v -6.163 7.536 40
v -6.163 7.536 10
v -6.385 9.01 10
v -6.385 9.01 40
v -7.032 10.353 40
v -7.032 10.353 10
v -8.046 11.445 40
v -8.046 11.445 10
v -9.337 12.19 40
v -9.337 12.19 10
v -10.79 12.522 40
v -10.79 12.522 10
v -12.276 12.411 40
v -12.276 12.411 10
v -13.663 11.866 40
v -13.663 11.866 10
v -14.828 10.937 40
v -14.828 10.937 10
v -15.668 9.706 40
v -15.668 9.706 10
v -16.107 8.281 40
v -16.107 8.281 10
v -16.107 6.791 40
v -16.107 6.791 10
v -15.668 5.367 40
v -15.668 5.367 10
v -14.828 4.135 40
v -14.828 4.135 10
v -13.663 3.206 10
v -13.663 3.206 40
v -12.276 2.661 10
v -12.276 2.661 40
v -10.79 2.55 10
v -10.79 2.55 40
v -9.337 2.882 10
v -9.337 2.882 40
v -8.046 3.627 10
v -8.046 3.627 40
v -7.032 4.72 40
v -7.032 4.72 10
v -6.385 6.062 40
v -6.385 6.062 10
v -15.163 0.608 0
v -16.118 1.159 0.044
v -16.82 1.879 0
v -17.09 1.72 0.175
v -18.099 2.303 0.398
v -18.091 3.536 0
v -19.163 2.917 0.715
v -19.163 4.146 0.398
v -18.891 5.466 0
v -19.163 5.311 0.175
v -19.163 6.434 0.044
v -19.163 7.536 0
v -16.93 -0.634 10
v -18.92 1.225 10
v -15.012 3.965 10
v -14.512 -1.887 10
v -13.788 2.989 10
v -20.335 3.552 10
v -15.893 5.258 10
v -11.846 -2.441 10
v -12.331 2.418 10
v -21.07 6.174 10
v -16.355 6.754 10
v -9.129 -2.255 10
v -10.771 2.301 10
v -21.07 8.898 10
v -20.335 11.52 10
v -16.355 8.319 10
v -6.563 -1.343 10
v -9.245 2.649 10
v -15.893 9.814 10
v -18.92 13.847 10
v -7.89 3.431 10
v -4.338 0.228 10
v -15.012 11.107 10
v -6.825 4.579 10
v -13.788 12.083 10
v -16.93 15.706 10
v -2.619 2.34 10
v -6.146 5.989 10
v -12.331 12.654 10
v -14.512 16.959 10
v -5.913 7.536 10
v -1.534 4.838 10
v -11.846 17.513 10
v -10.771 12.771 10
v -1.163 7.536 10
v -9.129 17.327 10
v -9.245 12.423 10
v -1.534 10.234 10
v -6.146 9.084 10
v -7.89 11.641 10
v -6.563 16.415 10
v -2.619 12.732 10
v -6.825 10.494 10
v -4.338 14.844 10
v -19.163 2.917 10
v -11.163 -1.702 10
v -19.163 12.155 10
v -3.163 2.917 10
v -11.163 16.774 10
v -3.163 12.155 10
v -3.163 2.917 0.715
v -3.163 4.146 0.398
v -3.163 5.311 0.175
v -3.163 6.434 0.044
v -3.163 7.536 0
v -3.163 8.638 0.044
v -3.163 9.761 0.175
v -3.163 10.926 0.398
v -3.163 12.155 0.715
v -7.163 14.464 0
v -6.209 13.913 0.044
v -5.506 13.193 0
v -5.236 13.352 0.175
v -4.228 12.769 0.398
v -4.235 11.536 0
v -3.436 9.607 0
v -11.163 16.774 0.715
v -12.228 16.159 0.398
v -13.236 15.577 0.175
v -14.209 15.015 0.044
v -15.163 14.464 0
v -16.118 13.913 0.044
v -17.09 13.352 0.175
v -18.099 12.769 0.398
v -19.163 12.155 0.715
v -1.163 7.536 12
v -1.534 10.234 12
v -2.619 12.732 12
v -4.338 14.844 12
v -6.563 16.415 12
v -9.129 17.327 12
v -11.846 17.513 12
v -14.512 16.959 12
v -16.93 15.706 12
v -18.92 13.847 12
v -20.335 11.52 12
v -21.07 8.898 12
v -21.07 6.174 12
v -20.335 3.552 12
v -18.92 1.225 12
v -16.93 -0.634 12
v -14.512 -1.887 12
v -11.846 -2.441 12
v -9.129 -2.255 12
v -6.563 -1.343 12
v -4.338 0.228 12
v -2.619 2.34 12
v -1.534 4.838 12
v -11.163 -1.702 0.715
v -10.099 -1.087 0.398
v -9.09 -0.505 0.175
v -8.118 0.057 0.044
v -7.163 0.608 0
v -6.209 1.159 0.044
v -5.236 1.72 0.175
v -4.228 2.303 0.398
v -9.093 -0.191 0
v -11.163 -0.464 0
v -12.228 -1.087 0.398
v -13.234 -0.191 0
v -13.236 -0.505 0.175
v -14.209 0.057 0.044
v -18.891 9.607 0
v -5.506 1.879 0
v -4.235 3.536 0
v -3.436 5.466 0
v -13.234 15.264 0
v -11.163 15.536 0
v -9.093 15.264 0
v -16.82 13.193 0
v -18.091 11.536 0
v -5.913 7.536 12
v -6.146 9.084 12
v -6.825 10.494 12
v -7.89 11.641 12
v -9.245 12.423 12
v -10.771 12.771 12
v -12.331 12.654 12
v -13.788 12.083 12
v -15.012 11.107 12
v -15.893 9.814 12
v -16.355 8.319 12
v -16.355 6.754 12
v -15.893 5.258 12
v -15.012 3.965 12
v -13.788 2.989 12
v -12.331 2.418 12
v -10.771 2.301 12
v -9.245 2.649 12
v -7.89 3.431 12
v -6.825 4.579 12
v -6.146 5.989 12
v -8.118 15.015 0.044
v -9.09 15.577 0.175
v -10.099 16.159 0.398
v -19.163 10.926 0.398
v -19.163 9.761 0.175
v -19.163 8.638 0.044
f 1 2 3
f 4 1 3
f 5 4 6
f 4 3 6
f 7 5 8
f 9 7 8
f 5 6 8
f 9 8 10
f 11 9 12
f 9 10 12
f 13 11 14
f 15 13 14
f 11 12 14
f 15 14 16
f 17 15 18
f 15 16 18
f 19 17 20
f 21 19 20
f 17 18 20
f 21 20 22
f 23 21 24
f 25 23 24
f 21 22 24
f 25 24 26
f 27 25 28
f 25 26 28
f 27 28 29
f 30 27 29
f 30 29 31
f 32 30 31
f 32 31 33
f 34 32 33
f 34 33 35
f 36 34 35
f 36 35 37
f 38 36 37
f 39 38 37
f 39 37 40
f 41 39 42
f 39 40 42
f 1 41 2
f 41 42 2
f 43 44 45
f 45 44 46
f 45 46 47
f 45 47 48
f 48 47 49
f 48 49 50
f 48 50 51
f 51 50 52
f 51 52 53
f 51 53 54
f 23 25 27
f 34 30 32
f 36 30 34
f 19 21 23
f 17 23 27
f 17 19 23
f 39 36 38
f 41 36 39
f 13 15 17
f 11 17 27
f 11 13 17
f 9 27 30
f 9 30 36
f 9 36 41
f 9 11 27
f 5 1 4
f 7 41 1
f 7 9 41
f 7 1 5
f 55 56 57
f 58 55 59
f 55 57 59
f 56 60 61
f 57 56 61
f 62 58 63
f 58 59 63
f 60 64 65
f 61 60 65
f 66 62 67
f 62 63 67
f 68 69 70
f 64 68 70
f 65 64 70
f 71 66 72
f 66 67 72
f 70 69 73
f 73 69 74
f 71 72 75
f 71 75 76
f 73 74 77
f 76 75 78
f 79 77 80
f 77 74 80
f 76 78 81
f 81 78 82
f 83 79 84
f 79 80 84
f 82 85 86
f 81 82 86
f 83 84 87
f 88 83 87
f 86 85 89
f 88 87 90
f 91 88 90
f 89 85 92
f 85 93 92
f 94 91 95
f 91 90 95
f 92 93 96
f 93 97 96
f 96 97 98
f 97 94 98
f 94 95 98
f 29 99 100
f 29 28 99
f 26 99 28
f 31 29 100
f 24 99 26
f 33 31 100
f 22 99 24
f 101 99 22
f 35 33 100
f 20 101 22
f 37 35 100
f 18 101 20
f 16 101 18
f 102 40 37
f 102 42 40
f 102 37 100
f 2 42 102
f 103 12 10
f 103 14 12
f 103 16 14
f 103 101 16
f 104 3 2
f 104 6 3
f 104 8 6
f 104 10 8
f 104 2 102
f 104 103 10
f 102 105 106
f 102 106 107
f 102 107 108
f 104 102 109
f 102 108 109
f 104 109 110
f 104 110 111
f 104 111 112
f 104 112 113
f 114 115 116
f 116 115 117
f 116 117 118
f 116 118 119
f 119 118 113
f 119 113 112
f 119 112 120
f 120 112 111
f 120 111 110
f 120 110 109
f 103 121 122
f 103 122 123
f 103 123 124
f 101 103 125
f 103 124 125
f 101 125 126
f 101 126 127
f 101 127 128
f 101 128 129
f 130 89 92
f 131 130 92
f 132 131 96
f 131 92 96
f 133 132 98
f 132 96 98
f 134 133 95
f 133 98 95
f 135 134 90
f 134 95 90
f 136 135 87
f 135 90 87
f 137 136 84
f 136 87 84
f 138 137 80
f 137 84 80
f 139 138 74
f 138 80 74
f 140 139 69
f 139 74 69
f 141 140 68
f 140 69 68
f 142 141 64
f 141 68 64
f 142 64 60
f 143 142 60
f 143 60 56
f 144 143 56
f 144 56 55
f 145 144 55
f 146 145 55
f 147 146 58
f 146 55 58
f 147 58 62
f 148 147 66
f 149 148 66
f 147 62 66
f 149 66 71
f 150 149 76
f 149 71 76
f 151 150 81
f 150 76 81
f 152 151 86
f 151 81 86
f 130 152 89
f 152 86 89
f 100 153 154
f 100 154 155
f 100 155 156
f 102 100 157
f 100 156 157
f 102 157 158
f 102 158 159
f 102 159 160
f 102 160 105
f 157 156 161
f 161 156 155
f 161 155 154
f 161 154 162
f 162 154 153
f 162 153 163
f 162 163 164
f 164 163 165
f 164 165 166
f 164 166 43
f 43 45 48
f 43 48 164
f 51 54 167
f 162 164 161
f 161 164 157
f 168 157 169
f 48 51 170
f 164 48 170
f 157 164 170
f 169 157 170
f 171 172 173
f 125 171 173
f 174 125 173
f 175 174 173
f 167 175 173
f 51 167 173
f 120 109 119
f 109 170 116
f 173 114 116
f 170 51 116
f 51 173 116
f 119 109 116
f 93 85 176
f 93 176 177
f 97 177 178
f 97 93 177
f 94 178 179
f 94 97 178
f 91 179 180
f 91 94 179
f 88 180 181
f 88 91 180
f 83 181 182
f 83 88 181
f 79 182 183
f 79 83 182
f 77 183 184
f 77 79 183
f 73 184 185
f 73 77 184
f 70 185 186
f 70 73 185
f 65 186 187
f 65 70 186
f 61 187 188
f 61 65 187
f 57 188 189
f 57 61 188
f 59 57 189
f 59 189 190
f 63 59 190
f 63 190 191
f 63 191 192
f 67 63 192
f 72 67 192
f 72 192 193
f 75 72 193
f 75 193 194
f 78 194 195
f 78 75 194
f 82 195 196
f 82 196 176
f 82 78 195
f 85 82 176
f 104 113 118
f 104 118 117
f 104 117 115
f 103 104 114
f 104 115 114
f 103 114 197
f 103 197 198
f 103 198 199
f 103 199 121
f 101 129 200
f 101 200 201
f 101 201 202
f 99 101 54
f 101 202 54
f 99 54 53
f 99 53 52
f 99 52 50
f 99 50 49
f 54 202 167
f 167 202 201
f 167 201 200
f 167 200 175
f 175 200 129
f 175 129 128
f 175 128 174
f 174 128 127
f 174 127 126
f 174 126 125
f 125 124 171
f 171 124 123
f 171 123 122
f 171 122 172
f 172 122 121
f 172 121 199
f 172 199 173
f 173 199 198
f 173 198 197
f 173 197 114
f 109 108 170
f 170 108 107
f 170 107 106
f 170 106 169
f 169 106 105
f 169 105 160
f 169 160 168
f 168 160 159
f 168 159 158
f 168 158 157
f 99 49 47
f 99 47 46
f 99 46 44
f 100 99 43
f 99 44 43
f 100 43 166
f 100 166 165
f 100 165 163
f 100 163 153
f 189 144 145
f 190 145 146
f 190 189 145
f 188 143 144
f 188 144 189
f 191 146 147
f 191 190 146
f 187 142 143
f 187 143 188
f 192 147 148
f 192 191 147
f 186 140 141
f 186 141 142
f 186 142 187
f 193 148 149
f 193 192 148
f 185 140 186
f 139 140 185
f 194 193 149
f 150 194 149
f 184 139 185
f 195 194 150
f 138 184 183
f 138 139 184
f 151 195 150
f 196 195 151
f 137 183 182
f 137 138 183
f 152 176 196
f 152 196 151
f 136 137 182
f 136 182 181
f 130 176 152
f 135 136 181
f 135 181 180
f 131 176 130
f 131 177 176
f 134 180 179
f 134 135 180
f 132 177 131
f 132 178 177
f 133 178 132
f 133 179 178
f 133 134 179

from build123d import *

# Parameters (mm, degrees)
SKETCH1_R           = 5
BOSS_EXTRUDE1_DEPTH = 10
BOSS_EXTRUDE2_START = 10
SKETCH1_3_R         = 5
BOSS_EXTRUDE2_DEPTH = 30
BOSS_EXTRUDE3_START = 10
SKETCH3_R           = 10
SKETCH3_R_2         = 5.25
BOSS_EXTRUDE3_DEPTH = 2


with BuildPart() as part:
    # Sketch1 → Boss-Extrude1 (new body)
    # profile 1 of 2: a face of its own
    with BuildSketch(Plane.XY):
        Polygon((-11.163210479, -1.701501358), (-3.163210479, 2.917300796), (-3.163210479, 12.154905103), (-11.163210479, 16.773707256), (-19.163210479, 12.154905103), (-19.163210479, 2.917300796), align=None)
        with Locations((-11.163210479, 7.536102949)):
            Circle(SKETCH1_R, mode=Mode.SUBTRACT)
    # profile 2 of 2: a face of its own
    with BuildSketch(Plane.XY):
        with Locations((-11.163210479, 7.536102949)):
            Circle(SKETCH1_R)
    extrude(amount=BOSS_EXTRUDE1_DEPTH)

    # Sketch1<3> → Boss-Extrude2 (add)
    with BuildSketch(Plane.XY.offset(BOSS_EXTRUDE2_START)):
        with Locations((-11.163210479, 7.536102949)):
            Circle(SKETCH1_3_R)
    extrude(amount=BOSS_EXTRUDE2_DEPTH)

    # Sketch6 → Cut-Revolve2 (revolve, cut)
    with BuildSketch(Plane(origin=(0, 7.536102949, 0), x_dir=(-1, 0, 0), z_dir=(0, -1, 0))):
        Polygon((16.038854826, 4.803847577), (16.038854826, 1.803847577), (28.163210479, -5.196152423), (30.038854826, -5.196152423), (30.038854826, 4.803847577), align=None)
    revolve(axis=Axis((-11.163210479, 7.536102949, 10.5), (0, 0, -1)), mode=Mode.SUBTRACT)


with BuildPart() as body_2:
    # Sketch3 → Boss-Extrude3 (new body)
    with BuildSketch(Plane.XY.offset(BOSS_EXTRUDE3_START)):
        with Locations((-11.163210479, 7.536102949)):
            Circle(SKETCH3_R)
        with Locations((-11.163210479, 7.536102949)):
            Circle(SKETCH3_R_2, mode=Mode.SUBTRACT)
    extrude(amount=BOSS_EXTRUDE3_DEPTH)


solid = Compound([part.part, body_2.part])
